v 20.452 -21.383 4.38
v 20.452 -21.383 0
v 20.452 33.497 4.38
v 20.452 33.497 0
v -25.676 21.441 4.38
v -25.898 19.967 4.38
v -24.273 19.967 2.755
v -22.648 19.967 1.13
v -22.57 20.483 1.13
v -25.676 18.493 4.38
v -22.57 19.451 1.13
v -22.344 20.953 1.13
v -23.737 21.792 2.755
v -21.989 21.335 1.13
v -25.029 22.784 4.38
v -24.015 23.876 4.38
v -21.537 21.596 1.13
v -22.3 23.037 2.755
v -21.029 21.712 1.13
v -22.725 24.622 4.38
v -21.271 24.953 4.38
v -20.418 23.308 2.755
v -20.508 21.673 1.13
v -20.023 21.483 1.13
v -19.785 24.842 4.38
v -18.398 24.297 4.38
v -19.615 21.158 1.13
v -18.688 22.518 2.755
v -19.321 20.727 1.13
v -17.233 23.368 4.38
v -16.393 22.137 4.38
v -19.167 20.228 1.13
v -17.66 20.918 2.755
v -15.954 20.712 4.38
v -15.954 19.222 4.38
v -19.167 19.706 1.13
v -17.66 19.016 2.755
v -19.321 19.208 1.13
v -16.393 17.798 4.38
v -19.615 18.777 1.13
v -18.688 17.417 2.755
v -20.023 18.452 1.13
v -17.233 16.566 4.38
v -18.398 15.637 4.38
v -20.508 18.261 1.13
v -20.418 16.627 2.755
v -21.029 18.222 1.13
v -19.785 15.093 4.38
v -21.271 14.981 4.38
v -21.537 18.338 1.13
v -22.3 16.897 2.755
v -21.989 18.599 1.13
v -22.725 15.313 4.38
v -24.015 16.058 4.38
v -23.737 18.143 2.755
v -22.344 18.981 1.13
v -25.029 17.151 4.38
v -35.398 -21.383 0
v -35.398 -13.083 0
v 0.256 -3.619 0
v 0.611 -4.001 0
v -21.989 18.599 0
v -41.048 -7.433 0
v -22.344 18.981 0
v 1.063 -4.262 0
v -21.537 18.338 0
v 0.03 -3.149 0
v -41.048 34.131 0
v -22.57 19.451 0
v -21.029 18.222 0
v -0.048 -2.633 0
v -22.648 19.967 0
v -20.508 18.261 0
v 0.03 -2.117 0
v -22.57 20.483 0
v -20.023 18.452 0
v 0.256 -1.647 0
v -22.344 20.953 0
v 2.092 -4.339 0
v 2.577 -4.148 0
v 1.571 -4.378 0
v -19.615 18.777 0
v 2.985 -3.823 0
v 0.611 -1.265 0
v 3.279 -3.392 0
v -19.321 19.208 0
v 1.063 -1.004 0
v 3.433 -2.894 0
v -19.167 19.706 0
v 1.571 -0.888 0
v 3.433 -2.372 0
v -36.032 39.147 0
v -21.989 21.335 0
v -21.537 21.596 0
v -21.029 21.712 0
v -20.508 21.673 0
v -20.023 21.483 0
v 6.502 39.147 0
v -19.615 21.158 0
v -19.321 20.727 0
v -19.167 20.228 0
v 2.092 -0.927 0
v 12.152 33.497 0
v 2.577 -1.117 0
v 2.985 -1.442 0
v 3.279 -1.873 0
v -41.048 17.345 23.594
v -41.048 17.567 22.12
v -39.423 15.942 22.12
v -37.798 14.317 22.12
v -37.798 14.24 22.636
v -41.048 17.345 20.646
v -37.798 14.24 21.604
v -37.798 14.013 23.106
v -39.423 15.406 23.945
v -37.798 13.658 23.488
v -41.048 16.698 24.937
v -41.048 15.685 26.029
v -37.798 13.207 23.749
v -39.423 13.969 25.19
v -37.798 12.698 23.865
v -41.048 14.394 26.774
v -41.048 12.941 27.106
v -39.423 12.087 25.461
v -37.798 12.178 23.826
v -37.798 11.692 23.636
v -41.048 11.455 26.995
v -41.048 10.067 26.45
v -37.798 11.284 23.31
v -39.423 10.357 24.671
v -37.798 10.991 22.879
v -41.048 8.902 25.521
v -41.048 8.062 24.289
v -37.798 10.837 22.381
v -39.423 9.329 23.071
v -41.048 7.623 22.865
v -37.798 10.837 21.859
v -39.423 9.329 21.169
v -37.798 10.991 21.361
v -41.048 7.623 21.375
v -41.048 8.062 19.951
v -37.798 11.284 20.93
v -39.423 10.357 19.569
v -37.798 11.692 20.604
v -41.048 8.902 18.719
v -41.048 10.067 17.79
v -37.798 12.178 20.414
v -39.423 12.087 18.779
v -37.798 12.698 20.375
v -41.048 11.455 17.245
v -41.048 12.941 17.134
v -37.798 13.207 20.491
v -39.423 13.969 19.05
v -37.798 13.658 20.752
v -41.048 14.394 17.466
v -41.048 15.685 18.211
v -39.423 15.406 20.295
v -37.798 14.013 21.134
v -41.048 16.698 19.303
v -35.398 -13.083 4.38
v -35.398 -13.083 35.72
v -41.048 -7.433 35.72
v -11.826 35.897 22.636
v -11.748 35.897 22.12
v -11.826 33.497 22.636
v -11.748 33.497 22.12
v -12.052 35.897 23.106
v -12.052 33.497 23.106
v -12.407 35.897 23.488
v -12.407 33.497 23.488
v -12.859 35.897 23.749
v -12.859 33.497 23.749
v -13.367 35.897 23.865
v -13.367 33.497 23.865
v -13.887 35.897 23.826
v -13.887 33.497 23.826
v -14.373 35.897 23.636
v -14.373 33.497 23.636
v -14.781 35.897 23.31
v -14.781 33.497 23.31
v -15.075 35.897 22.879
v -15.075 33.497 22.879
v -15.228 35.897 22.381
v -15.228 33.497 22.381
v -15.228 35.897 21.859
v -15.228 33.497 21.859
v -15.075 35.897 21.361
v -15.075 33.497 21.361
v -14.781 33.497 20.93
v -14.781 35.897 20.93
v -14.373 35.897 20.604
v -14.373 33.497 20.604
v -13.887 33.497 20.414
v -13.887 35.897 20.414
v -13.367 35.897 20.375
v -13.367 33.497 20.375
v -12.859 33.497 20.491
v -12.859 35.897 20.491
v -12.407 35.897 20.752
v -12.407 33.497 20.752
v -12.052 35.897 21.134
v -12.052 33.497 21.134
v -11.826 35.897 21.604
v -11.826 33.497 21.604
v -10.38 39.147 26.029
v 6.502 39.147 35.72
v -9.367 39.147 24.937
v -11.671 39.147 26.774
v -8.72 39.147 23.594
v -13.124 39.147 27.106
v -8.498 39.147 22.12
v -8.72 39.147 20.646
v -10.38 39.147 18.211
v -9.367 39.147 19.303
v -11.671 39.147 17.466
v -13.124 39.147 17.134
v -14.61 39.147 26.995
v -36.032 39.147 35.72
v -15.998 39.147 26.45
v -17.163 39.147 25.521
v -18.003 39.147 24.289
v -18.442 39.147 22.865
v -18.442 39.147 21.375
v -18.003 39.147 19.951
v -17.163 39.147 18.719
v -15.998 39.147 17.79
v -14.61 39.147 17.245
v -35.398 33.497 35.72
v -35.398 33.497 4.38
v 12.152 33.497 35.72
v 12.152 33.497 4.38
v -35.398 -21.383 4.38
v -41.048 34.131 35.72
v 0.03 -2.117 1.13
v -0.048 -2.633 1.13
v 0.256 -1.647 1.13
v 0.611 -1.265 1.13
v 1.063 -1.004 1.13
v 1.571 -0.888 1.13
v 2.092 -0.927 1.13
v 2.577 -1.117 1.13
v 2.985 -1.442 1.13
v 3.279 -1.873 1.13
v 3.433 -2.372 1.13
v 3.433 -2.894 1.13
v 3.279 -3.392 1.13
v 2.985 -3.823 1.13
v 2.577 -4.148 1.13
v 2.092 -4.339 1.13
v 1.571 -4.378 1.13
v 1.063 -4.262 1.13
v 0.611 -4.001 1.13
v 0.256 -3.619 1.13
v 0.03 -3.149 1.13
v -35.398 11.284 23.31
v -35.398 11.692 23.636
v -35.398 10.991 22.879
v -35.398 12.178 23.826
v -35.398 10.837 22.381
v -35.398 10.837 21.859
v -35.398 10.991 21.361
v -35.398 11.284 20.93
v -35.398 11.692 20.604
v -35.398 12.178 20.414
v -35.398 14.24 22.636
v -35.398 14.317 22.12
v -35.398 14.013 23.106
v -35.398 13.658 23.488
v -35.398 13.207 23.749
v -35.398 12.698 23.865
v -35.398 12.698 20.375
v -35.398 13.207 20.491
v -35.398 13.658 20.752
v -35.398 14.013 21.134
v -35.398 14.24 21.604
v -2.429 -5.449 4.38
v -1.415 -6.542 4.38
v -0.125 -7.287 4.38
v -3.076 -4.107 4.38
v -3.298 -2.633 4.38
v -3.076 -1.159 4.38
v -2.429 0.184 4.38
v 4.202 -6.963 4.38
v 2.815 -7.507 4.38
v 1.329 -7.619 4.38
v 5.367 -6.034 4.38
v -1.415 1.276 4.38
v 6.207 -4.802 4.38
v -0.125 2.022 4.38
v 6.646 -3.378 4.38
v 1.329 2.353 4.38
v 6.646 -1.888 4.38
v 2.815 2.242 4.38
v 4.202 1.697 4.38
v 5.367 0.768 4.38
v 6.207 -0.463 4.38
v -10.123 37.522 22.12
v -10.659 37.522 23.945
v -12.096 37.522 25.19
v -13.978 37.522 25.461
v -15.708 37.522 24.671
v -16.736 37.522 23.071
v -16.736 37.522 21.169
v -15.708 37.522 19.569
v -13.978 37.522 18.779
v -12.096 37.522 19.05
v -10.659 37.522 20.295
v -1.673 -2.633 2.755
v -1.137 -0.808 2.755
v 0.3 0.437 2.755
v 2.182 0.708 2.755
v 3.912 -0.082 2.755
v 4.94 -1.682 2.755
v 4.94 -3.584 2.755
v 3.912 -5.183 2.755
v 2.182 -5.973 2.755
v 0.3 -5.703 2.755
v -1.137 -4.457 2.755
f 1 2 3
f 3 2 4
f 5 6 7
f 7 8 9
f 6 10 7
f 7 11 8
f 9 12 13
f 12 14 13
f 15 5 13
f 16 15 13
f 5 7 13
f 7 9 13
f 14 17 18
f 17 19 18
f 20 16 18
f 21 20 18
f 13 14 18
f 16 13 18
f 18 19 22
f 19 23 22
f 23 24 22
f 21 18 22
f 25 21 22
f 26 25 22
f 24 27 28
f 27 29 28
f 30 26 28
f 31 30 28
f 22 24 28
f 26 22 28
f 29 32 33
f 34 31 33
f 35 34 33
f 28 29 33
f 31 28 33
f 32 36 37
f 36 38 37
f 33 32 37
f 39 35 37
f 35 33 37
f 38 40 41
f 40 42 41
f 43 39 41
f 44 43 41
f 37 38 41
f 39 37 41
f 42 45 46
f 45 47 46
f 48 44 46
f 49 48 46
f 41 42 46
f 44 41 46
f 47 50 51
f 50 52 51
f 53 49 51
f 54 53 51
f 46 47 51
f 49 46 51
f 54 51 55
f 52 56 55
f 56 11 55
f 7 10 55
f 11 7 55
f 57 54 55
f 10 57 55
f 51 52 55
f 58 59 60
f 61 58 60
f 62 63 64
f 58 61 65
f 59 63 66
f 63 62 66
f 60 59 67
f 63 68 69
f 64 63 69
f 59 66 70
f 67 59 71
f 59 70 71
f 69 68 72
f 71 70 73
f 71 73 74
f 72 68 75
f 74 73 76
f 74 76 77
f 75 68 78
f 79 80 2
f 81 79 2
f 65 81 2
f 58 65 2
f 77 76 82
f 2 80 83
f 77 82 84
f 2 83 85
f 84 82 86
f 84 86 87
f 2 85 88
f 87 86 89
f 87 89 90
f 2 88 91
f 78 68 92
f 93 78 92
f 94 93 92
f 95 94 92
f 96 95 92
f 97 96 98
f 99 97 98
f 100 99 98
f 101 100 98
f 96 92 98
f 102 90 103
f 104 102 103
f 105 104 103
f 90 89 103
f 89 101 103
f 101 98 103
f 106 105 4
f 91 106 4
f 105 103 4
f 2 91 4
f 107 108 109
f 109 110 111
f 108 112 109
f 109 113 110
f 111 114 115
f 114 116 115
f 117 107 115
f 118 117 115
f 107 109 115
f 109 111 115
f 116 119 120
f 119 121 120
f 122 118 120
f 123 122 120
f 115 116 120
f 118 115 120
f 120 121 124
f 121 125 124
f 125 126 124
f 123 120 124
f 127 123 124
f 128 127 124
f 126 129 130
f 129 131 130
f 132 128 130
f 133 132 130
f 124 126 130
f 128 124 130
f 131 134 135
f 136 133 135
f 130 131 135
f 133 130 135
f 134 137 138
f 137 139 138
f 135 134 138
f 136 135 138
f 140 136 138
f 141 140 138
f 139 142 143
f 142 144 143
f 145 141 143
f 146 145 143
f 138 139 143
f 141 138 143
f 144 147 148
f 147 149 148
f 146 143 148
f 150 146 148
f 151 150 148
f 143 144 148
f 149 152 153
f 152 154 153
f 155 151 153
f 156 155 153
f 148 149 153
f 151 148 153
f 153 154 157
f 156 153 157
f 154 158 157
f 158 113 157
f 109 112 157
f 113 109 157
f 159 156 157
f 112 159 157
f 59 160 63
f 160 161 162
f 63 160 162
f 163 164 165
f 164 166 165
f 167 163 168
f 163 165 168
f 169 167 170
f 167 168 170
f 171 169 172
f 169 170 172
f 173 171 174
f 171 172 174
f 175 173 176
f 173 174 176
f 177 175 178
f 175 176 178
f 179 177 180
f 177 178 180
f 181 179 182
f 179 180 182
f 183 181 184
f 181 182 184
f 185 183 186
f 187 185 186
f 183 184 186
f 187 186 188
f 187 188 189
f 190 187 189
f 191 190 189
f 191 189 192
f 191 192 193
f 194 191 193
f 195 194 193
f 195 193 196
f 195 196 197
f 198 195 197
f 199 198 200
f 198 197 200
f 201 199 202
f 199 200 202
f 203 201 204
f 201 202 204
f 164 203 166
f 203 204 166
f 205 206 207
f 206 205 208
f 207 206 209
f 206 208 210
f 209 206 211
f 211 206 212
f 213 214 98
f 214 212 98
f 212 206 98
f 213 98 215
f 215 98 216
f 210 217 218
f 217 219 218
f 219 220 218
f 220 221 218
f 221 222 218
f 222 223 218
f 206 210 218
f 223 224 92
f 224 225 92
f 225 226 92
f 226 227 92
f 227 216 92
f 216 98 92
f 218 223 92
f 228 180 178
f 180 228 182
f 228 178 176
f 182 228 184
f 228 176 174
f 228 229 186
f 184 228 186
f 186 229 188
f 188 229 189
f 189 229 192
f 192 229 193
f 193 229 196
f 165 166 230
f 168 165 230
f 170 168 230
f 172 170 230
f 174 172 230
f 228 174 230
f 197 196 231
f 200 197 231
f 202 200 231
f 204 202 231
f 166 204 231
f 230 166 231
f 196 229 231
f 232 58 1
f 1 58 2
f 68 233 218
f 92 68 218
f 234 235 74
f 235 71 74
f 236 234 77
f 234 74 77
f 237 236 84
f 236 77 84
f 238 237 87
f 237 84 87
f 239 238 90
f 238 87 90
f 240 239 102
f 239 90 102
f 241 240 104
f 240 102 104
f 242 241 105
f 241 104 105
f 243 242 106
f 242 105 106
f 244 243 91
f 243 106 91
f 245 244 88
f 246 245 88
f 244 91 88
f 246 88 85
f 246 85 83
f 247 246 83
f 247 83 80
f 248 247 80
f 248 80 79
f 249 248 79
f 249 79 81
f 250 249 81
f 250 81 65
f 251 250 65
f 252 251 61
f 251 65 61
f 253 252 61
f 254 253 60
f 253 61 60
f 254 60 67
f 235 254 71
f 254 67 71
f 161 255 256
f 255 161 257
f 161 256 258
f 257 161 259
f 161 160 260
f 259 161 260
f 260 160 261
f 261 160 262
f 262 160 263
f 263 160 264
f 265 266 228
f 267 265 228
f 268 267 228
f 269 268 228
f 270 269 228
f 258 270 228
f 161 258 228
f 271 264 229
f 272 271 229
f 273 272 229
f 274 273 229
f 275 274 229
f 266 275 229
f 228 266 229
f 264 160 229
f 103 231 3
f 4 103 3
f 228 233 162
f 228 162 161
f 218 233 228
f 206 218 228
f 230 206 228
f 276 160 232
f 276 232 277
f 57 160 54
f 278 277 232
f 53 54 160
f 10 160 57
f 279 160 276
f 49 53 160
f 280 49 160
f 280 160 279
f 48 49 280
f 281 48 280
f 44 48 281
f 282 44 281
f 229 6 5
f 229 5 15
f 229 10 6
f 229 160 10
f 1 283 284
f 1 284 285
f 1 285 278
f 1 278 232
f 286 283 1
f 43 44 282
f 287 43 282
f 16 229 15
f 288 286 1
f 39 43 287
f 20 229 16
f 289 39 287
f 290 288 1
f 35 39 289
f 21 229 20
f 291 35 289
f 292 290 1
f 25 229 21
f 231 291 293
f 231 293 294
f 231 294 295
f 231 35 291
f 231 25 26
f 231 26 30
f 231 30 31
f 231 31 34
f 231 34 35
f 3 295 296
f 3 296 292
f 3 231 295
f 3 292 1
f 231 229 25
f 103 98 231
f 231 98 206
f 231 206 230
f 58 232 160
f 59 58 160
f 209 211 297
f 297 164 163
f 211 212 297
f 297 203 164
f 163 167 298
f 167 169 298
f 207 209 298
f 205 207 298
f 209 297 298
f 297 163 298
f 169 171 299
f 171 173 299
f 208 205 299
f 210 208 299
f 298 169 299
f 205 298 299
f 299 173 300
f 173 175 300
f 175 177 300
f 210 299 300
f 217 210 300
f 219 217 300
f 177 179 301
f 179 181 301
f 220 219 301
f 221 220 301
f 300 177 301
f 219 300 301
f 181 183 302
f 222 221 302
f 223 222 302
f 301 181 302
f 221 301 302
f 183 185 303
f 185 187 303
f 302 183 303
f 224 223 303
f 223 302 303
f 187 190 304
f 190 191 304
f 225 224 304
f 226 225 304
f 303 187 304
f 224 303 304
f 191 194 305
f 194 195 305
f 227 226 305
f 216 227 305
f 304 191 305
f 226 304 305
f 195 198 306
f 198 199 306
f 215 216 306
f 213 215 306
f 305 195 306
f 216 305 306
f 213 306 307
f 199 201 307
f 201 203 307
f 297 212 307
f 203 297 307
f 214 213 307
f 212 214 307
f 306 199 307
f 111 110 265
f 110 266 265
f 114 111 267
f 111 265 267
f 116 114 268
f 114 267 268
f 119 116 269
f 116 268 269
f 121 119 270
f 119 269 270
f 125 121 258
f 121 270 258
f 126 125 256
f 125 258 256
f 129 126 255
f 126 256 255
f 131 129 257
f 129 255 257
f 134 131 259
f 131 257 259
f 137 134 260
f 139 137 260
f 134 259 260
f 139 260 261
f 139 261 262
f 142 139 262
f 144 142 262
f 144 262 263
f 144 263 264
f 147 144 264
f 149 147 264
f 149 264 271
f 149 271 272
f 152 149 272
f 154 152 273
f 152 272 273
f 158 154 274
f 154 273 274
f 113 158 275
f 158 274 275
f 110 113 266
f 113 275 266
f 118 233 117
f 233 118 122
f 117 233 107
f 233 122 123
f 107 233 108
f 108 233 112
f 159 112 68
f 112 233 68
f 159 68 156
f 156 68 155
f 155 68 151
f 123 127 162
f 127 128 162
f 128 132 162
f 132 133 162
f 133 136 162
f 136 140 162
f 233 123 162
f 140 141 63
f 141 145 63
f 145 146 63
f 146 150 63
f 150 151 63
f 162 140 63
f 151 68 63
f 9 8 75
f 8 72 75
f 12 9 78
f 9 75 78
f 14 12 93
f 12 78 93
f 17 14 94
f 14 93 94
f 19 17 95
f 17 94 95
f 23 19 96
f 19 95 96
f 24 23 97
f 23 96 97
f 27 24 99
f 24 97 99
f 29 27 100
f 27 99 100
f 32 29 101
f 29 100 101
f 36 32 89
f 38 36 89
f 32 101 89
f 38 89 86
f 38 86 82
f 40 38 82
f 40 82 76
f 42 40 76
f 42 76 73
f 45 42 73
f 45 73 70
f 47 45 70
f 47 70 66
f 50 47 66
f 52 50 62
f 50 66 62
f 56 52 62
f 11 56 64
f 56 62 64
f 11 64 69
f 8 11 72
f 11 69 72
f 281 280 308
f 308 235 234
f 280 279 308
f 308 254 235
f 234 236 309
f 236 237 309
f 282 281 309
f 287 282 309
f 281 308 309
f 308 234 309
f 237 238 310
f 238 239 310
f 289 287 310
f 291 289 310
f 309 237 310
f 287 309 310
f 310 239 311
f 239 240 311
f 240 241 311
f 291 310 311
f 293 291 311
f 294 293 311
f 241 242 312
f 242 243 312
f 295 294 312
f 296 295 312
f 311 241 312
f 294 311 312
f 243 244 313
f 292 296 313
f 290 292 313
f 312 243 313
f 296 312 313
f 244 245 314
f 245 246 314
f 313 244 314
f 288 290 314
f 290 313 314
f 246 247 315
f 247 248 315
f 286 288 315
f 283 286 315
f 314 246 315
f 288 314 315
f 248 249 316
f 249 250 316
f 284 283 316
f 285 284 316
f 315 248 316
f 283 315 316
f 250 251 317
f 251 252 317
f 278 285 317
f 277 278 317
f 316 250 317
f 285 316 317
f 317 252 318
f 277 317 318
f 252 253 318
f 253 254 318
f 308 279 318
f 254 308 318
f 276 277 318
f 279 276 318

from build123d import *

# Parameters (mm, degrees)
F0_W            = 61.5
F0_H            = 60.53
F1_DEPTH        = 4.38
F3_DEPTH        = 31.34
F4_W            = 5.65
F4_H            = 8.3
F4_W_2          = 8.3
F4_H_2          = 5.65
F5_DEPTH        = 35.72
F7_DEPTH        = 35.72
F9_DEPTH        = 35.72
F11_D           = 3.5
F11_CSINK_D     = 10
F11_CSINK_ANGLE = 90
F13_D           = 3.5
F13_CSINK_D     = 10
F13_CSINK_ANGLE = 90
F15_D           = 3.5
F15_CSINK_D     = 10
F15_CSINK_ANGLE = 90
F17_D           = 3.5
F17_CSINK_D     = 10
F17_CSINK_ANGLE = 90


with BuildPart() as f1:
    # F0 (on Top) → F1 (new body)
    with BuildSketch(Plane.XY):
        with Locations((-10.297848, 8.882269)):
            Rectangle(F0_W, F0_H)
    extrude(amount=F1_DEPTH)

    # F2 (on face) → F3 (join)
    with BuildSketch(Plane.XY.offset(4.38)):
        Polygon((-41.047848, 39.147269), (-41.047848, -21.382731), (-35.397848, -21.382731), (-35.397848, 33.497269), (20.452152, 33.497269), (20.452152, 39.147269), (-35.397848, 39.147269), align=None)
    extrude(amount=F3_DEPTH)

    # F4 (on face) → F5 (cut, through all)
    with BuildSketch(Plane.XY.offset(35.72)):
        with Locations((-38.222848, -17.232731)):
            Rectangle(F4_W, F4_H)
        with Locations((16.302152, 36.322269)):
            Rectangle(F4_W_2, F4_H_2)
    extrude(amount=-F5_DEPTH, mode=Mode.SUBTRACT)

    # F6 (on face) → F7 (cut, through all)
    with BuildSketch(Plane.XY.offset(35.72)):
        Polygon((-41.047848, -13.082731), (-35.397848, -13.082731), (-41.047848, -7.432731), align=None)
        Polygon((6.502152, 39.147269), (12.152152, 33.497269), (12.152152, 39.147269), align=None)
    extrude(amount=-F7_DEPTH, mode=Mode.SUBTRACT)

    # F8 (on face) → F9 (cut, through all)
    with BuildSketch(Plane.XY.offset(35.72)):
        Polygon((-41.047848, 34.130973), (-36.031552, 39.147269), (-41.047848, 39.147269), align=None)
    extrude(amount=-F9_DEPTH, mode=Mode.SUBTRACT)

    # F11 (through all)
    with Locations(Plane.XY.offset(4.38)):
        with Locations((1.702152, -2.632731)):
            CounterSinkHole(F11_D / 2, F11_CSINK_D / 2, counter_sink_angle=F11_CSINK_ANGLE)

    # F13 (through all)
    with Locations(Plane.XY.offset(4.38)):
        with Locations((-20.897848, 19.967269)):
            CounterSinkHole(F13_D / 2, F13_CSINK_D / 2, counter_sink_angle=F13_CSINK_ANGLE)

    # F15 (through all)
    with Locations(Plane(origin=(0, 39.147269, 0), x_dir=(-1, 0, 0), z_dir=(0, 1, 0))):
        with Locations((13.497848, 22.12)):
            CounterSinkHole(F15_D / 2, F15_CSINK_D / 2, counter_sink_angle=F15_CSINK_ANGLE)

    # F17 (through all)
    with Locations(Plane(origin=(-41.047848, 0, 0), x_dir=(0, -1, 0), z_dir=(-1, 0, 0))):
        with Locations((-12.567269, 22.12)):
            CounterSinkHole(F17_D / 2, F17_CSINK_D / 2, counter_sink_angle=F17_CSINK_ANGLE)


solid = f1.part
